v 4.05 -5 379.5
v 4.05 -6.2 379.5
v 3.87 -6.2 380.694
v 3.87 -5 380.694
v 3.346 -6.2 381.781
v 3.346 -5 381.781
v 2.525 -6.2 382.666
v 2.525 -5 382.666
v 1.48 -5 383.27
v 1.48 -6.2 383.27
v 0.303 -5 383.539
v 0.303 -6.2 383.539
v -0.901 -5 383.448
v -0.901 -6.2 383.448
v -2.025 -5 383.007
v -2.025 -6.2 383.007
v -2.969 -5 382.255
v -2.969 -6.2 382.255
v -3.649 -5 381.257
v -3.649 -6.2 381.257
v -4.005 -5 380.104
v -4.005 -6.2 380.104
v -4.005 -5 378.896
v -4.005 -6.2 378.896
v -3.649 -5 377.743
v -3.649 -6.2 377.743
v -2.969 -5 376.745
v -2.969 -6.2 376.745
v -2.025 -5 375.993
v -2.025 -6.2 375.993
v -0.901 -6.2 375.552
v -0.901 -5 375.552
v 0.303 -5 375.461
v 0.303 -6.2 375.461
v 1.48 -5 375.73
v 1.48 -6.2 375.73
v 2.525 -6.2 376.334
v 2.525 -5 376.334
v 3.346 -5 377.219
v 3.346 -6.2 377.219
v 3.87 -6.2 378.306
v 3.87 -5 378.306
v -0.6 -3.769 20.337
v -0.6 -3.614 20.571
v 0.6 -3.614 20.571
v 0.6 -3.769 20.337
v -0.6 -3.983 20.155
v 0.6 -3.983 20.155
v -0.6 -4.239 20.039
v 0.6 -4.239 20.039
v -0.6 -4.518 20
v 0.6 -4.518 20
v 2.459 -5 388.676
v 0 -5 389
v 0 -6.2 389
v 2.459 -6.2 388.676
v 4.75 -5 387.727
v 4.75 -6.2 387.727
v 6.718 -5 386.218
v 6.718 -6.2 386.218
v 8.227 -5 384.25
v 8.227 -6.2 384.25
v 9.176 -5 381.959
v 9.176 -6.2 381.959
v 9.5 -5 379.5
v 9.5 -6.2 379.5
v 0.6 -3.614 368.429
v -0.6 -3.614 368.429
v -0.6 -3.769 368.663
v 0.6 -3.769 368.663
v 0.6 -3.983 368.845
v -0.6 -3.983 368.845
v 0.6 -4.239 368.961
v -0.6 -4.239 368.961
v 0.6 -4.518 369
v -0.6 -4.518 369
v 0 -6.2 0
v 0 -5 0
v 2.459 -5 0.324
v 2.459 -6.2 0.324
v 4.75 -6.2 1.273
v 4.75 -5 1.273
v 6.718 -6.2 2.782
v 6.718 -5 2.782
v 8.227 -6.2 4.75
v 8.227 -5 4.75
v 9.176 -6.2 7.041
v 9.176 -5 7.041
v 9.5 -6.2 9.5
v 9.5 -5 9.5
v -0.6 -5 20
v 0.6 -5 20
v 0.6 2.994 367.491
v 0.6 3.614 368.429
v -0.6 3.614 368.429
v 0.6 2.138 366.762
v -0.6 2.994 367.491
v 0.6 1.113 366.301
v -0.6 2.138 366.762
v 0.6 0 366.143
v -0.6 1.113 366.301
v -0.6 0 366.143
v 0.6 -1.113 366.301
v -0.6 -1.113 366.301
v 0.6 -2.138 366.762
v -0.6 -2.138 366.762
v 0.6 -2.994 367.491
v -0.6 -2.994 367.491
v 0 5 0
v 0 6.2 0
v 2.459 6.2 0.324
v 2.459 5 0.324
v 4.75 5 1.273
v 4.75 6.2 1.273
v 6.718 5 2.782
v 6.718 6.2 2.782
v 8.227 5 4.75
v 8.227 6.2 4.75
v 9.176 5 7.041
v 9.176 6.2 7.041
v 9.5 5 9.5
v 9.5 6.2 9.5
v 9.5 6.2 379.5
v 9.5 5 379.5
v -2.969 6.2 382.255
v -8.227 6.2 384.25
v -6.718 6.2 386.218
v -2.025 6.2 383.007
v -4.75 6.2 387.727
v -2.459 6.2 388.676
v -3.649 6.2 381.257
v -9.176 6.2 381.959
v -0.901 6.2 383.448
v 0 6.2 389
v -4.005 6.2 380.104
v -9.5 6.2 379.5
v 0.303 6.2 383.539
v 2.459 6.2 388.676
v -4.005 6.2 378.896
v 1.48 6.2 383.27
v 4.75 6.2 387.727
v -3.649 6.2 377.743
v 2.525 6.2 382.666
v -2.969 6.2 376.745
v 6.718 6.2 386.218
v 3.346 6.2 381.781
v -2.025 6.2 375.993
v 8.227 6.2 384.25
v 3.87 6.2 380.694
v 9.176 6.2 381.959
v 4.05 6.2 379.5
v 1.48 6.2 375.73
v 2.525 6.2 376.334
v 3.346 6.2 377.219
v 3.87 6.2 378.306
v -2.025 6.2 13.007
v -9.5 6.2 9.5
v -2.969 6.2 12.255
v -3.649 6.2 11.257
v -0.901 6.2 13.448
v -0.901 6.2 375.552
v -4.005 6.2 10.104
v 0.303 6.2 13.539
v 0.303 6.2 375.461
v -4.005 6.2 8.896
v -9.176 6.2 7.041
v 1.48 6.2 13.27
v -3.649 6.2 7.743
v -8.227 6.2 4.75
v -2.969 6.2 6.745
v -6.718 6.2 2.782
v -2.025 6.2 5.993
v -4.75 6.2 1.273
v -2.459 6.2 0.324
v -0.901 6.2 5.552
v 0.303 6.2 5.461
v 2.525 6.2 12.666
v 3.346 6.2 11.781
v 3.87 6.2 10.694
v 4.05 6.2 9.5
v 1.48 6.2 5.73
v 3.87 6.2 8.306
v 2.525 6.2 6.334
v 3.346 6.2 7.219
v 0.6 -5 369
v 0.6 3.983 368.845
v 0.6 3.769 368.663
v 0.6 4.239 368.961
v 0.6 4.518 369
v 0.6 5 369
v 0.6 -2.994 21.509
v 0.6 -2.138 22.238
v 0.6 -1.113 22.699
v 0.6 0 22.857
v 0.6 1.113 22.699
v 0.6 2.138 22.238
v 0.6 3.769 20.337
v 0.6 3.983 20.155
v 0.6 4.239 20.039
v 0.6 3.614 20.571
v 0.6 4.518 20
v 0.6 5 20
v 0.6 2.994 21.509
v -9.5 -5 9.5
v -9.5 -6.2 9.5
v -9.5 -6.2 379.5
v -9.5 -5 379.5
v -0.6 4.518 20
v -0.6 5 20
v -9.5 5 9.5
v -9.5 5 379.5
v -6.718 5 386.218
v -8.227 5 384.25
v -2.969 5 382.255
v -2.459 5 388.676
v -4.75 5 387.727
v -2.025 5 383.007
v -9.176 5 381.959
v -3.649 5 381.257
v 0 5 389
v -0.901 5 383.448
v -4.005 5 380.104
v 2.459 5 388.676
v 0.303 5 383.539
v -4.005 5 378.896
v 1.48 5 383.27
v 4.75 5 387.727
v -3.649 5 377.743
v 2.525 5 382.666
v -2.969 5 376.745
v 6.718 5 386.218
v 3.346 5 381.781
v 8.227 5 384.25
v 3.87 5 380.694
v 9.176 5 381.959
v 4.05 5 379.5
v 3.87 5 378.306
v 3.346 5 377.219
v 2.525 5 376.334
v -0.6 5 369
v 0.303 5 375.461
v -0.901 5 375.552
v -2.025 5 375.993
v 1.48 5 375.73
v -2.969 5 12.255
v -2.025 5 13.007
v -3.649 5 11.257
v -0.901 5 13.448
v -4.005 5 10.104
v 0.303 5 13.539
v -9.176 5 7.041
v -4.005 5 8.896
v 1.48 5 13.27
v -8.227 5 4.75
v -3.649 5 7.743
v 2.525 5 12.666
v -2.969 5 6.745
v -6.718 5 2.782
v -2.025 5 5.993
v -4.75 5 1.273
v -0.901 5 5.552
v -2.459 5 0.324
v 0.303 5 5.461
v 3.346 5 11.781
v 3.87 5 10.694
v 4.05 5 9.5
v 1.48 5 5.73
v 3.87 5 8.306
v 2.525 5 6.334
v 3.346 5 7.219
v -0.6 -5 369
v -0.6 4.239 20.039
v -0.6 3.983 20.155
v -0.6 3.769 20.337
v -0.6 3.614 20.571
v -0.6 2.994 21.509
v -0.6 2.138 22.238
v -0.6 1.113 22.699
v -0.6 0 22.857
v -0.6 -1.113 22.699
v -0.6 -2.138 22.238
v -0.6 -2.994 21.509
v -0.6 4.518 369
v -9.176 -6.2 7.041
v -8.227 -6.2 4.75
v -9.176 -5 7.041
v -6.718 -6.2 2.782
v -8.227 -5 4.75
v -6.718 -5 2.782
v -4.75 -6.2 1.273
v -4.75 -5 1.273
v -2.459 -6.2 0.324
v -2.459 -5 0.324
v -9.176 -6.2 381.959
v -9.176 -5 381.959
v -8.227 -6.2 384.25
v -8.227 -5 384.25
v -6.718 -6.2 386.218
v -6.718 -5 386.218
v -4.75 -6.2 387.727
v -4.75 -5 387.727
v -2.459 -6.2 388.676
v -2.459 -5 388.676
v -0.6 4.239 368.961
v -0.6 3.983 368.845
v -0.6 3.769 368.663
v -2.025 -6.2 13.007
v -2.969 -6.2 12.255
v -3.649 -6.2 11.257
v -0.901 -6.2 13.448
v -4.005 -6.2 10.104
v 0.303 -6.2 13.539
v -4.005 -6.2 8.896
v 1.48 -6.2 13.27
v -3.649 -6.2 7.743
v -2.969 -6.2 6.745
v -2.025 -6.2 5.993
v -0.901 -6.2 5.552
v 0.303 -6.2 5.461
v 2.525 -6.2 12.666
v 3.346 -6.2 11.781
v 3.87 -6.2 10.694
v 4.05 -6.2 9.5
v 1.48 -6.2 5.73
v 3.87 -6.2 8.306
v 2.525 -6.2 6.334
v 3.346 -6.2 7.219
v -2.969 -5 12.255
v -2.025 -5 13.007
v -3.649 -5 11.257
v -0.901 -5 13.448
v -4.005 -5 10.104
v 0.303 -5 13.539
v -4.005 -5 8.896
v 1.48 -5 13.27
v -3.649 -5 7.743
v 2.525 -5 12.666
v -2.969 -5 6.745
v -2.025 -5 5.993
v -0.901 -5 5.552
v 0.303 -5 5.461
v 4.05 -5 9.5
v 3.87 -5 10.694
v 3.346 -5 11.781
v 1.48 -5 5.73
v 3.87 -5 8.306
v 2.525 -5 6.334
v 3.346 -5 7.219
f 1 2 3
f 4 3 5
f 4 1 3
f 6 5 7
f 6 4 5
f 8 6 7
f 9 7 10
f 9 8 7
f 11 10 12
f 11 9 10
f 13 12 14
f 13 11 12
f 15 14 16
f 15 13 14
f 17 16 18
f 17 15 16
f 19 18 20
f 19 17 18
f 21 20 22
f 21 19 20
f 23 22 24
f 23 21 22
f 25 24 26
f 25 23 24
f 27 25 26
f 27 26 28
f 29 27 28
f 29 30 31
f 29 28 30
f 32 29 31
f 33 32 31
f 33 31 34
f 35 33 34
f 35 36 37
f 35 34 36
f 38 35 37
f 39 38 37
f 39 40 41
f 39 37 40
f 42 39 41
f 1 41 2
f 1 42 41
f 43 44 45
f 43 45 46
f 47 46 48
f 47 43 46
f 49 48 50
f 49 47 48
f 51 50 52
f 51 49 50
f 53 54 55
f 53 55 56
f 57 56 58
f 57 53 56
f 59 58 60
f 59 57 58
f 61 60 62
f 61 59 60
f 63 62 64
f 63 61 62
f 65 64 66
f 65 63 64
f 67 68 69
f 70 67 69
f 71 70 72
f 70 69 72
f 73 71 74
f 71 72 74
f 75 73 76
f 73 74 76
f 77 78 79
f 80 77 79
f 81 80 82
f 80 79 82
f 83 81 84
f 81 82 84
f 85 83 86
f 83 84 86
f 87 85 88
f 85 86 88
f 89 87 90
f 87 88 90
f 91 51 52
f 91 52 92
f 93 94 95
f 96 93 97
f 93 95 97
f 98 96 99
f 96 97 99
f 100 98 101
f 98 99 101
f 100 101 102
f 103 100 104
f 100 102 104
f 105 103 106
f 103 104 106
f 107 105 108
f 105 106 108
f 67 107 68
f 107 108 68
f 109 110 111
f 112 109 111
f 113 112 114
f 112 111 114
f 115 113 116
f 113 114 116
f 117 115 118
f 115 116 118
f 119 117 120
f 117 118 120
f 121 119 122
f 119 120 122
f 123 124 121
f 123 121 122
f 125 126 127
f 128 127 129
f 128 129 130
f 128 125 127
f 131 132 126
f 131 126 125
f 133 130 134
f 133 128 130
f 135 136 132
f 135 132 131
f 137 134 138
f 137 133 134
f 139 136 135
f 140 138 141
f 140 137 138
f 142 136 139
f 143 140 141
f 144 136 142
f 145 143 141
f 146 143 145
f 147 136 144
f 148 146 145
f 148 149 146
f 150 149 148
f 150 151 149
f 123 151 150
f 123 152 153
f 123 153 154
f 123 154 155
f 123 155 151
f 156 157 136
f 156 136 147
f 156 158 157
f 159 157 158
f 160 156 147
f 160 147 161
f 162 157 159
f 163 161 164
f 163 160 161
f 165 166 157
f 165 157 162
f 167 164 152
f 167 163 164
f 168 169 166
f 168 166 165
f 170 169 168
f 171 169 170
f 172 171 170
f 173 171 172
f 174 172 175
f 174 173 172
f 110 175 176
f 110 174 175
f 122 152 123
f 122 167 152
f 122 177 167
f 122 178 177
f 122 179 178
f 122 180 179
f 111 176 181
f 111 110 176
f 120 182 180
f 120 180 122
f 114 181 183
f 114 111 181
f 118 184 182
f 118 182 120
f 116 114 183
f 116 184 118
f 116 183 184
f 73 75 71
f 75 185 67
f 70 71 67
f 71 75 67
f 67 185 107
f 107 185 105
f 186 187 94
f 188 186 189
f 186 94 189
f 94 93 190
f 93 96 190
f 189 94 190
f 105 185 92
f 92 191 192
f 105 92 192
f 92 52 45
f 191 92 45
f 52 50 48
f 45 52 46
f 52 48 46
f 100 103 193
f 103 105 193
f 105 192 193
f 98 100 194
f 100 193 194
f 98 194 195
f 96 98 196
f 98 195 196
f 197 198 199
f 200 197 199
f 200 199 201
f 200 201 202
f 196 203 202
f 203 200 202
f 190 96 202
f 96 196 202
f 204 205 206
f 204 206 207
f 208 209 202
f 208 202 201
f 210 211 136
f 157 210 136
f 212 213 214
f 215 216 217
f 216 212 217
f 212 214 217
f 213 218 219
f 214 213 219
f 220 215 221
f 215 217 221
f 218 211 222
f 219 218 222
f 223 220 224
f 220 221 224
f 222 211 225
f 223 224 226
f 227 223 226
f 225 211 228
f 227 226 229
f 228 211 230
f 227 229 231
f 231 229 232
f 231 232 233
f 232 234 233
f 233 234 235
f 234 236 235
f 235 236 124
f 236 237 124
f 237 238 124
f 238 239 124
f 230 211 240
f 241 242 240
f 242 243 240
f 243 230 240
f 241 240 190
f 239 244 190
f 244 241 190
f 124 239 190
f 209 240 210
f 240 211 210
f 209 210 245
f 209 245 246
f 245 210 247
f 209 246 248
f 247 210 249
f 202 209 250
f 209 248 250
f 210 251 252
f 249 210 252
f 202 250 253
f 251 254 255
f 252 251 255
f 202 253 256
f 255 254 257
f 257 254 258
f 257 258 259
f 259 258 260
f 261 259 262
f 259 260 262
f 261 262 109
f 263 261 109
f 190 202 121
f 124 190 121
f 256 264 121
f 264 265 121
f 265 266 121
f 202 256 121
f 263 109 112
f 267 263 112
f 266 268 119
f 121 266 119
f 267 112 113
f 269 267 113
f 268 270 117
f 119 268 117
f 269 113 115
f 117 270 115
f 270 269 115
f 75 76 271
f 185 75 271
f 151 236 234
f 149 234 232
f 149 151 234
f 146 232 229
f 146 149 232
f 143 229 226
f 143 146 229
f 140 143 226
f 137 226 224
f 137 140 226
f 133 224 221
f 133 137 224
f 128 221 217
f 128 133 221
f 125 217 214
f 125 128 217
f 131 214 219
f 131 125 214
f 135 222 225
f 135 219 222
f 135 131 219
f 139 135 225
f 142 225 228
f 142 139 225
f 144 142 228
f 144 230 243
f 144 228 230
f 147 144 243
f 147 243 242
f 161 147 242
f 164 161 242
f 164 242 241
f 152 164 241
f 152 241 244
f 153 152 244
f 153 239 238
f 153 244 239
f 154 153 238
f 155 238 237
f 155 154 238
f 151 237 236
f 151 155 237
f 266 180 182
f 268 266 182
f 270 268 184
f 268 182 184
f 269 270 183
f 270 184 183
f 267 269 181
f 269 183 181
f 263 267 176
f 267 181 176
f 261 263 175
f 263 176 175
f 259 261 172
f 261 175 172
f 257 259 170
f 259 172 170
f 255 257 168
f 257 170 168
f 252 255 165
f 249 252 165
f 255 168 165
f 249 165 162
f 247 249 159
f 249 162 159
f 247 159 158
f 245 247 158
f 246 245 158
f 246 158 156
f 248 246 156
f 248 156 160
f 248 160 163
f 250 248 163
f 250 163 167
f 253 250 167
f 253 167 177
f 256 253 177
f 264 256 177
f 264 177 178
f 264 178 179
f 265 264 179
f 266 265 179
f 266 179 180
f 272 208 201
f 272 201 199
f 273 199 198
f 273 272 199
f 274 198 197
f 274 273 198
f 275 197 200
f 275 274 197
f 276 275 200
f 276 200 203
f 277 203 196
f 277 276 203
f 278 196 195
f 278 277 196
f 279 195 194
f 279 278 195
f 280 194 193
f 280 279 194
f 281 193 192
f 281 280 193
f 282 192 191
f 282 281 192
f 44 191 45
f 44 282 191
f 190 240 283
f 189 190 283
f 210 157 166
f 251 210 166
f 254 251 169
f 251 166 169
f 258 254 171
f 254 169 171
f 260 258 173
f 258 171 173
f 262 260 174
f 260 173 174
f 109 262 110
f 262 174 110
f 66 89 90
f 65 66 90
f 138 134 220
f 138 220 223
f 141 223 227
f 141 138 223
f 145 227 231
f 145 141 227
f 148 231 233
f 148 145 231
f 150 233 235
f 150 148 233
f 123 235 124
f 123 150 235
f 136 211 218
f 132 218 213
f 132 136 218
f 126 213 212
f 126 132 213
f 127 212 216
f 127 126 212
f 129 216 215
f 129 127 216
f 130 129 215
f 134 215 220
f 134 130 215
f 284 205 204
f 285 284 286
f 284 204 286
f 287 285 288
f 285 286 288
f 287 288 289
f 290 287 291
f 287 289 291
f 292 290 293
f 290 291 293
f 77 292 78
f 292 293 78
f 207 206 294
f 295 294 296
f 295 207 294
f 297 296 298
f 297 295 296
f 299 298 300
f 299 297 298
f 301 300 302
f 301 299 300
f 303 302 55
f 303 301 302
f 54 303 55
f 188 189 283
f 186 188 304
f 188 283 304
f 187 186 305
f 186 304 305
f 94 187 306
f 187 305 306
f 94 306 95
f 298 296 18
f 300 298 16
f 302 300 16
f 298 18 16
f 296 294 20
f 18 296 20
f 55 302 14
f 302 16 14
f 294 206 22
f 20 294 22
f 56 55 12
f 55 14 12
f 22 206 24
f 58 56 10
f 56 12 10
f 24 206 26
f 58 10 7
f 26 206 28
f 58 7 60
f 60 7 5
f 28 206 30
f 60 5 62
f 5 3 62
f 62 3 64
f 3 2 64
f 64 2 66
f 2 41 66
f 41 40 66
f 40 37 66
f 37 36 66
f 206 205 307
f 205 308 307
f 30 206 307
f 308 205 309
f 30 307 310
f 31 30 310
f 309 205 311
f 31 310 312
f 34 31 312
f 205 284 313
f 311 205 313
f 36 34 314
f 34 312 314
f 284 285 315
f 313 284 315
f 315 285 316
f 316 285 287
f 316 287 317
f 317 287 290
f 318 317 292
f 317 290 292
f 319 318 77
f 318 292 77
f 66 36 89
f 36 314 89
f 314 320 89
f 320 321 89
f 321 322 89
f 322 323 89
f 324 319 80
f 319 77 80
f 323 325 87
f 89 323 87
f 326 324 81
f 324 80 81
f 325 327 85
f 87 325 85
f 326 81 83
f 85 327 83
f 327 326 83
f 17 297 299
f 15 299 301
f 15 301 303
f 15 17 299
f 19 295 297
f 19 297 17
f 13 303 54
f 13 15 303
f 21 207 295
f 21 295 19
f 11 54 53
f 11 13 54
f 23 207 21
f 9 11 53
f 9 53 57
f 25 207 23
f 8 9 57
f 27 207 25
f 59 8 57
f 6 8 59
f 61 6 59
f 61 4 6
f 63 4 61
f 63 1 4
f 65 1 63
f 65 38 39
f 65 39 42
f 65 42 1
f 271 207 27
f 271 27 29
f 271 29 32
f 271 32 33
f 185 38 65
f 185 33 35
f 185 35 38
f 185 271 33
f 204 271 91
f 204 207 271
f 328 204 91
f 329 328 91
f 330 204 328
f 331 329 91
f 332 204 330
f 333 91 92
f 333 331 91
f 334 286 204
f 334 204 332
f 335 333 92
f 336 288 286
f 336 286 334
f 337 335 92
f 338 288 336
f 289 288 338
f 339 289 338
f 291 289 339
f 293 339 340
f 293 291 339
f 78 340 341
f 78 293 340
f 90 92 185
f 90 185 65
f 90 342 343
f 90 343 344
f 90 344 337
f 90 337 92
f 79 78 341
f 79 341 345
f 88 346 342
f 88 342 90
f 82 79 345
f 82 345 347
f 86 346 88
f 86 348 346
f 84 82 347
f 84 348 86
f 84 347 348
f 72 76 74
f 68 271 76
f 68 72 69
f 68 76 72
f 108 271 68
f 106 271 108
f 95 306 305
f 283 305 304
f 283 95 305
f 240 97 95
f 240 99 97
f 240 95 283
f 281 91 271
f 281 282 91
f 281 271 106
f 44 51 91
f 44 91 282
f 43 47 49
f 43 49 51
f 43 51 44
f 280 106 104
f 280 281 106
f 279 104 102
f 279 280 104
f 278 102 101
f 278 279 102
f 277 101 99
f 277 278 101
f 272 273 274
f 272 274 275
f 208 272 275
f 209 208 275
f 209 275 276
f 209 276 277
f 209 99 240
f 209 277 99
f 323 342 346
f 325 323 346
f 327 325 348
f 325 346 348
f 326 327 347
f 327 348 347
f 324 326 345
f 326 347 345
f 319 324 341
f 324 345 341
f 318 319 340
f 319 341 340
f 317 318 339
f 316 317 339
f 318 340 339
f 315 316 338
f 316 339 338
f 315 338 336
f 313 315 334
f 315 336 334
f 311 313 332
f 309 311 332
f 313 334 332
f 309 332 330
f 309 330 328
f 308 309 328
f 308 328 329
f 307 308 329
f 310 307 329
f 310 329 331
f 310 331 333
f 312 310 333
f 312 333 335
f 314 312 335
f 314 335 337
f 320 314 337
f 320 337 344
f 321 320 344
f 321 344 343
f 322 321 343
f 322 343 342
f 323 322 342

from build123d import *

# Parameters (mm, degrees)
SKETCH1_W           = 1.2
SKETCH1_H           = 10
SKETCH1_W_2         = 19
SKETCH1_H_2         = 1.2
BOSS_EXTRUDE1_DEPTH = 389
SKETCH3_R           = 4.05
CUT_EXTRUDE2_DEPTH  = 370
CUT_EXTRUDE4_DEPTH  = 370


with BuildPart() as part:
    # Sketch1 → Boss-Extrude1 (new body)
    with BuildSketch(Plane.XY):
        Rectangle(SKETCH1_W, SKETCH1_H)
        with Locations((0, -5.6)):
            Rectangle(SKETCH1_W_2, SKETCH1_H_2)
        with Locations((0, 5.6)):
            Rectangle(SKETCH1_W_2, SKETCH1_H_2)
    extrude(amount=BOSS_EXTRUDE1_DEPTH)

    # Sketch3 → Cut-Extrude2 (cut)
    with BuildSketch(Plane(origin=(0, 6.2, 0), x_dir=(1, 0, 0), z_dir=(0, 1, 0))):
        with BuildLine():
            Line((-9.5, 0), (-9.5, -9.5))
            ThreePointArc((-9.5, -9.5), (-6.717514436, -2.782485594), (-4.2e-08, 0))
            Line((-4.2e-08, 0), (-9.5, 0))
        make_face()
        with BuildLine():
            Line((9.5, 0), (-4.2e-08, 0))
            ThreePointArc((-4.2e-08, 0), (6.717514406, -2.782485564), (9.5, -9.5))
            Line((9.5, -9.5), (9.5, 0))
        make_face()
        with BuildLine():
            ThreePointArc((14.5, -9.5), (0, 5), (-14.5, -9.5))
            Line((-14.5, -9.5), (-9.5, -9.5))
            Line((-9.5, -9.5), (-9.5, 0))
            Line((-9.5, 0), (-4.2e-08, 0))
            Line((-4.2e-08, 0), (9.5, 0))
            Line((9.5, 0), (9.5, -9.5))
            Line((9.5, -9.5), (14.5, -9.5))
        make_face()
        with Locations((0, -9.5)):
            Circle(SKETCH3_R)
    cut_extrude2 = extrude(amount=-CUT_EXTRUDE2_DEPTH, mode=Mode.SUBTRACT)

    # Mirror1: Cut-Extrude2 across plane
    add(cut_extrude2.mirror(Plane.XY.offset(194.5)), mode=Mode.SUBTRACT)

    # Sketch6 → Cut-Extrude4 (cut)
    with BuildSketch(Plane.ZY.offset(0.6)):
        with BuildLine():
            Line((20, -5), (-1, -5))
            Line((-1, -5), (-1, 5))
            Line((-1, 5), (20, 5))
            Line((20, 5), (20, 4.517635543))
            ThreePointArc((20, 4.517635543), (20.154857723, 3.983094121), (20.571469063, 3.614108434))
            ThreePointArc((20.571469063, 3.614108434), (22.857345314, 0), (20.571469063, -3.614108434))
            ThreePointArc((20.571469063, -3.614108434), (20.154857723, -3.983094121), (20, -4.517635543))
            Line((20, -4.517635543), (20, -5))
        make_face()
    cut_extrude4 = extrude(amount=-CUT_EXTRUDE4_DEPTH, mode=Mode.SUBTRACT)

    # Mirror2: Cut-Extrude4 across plane
    add(cut_extrude4.mirror(Plane.XY.offset(194.5)), mode=Mode.SUBTRACT)


solid = part.part
